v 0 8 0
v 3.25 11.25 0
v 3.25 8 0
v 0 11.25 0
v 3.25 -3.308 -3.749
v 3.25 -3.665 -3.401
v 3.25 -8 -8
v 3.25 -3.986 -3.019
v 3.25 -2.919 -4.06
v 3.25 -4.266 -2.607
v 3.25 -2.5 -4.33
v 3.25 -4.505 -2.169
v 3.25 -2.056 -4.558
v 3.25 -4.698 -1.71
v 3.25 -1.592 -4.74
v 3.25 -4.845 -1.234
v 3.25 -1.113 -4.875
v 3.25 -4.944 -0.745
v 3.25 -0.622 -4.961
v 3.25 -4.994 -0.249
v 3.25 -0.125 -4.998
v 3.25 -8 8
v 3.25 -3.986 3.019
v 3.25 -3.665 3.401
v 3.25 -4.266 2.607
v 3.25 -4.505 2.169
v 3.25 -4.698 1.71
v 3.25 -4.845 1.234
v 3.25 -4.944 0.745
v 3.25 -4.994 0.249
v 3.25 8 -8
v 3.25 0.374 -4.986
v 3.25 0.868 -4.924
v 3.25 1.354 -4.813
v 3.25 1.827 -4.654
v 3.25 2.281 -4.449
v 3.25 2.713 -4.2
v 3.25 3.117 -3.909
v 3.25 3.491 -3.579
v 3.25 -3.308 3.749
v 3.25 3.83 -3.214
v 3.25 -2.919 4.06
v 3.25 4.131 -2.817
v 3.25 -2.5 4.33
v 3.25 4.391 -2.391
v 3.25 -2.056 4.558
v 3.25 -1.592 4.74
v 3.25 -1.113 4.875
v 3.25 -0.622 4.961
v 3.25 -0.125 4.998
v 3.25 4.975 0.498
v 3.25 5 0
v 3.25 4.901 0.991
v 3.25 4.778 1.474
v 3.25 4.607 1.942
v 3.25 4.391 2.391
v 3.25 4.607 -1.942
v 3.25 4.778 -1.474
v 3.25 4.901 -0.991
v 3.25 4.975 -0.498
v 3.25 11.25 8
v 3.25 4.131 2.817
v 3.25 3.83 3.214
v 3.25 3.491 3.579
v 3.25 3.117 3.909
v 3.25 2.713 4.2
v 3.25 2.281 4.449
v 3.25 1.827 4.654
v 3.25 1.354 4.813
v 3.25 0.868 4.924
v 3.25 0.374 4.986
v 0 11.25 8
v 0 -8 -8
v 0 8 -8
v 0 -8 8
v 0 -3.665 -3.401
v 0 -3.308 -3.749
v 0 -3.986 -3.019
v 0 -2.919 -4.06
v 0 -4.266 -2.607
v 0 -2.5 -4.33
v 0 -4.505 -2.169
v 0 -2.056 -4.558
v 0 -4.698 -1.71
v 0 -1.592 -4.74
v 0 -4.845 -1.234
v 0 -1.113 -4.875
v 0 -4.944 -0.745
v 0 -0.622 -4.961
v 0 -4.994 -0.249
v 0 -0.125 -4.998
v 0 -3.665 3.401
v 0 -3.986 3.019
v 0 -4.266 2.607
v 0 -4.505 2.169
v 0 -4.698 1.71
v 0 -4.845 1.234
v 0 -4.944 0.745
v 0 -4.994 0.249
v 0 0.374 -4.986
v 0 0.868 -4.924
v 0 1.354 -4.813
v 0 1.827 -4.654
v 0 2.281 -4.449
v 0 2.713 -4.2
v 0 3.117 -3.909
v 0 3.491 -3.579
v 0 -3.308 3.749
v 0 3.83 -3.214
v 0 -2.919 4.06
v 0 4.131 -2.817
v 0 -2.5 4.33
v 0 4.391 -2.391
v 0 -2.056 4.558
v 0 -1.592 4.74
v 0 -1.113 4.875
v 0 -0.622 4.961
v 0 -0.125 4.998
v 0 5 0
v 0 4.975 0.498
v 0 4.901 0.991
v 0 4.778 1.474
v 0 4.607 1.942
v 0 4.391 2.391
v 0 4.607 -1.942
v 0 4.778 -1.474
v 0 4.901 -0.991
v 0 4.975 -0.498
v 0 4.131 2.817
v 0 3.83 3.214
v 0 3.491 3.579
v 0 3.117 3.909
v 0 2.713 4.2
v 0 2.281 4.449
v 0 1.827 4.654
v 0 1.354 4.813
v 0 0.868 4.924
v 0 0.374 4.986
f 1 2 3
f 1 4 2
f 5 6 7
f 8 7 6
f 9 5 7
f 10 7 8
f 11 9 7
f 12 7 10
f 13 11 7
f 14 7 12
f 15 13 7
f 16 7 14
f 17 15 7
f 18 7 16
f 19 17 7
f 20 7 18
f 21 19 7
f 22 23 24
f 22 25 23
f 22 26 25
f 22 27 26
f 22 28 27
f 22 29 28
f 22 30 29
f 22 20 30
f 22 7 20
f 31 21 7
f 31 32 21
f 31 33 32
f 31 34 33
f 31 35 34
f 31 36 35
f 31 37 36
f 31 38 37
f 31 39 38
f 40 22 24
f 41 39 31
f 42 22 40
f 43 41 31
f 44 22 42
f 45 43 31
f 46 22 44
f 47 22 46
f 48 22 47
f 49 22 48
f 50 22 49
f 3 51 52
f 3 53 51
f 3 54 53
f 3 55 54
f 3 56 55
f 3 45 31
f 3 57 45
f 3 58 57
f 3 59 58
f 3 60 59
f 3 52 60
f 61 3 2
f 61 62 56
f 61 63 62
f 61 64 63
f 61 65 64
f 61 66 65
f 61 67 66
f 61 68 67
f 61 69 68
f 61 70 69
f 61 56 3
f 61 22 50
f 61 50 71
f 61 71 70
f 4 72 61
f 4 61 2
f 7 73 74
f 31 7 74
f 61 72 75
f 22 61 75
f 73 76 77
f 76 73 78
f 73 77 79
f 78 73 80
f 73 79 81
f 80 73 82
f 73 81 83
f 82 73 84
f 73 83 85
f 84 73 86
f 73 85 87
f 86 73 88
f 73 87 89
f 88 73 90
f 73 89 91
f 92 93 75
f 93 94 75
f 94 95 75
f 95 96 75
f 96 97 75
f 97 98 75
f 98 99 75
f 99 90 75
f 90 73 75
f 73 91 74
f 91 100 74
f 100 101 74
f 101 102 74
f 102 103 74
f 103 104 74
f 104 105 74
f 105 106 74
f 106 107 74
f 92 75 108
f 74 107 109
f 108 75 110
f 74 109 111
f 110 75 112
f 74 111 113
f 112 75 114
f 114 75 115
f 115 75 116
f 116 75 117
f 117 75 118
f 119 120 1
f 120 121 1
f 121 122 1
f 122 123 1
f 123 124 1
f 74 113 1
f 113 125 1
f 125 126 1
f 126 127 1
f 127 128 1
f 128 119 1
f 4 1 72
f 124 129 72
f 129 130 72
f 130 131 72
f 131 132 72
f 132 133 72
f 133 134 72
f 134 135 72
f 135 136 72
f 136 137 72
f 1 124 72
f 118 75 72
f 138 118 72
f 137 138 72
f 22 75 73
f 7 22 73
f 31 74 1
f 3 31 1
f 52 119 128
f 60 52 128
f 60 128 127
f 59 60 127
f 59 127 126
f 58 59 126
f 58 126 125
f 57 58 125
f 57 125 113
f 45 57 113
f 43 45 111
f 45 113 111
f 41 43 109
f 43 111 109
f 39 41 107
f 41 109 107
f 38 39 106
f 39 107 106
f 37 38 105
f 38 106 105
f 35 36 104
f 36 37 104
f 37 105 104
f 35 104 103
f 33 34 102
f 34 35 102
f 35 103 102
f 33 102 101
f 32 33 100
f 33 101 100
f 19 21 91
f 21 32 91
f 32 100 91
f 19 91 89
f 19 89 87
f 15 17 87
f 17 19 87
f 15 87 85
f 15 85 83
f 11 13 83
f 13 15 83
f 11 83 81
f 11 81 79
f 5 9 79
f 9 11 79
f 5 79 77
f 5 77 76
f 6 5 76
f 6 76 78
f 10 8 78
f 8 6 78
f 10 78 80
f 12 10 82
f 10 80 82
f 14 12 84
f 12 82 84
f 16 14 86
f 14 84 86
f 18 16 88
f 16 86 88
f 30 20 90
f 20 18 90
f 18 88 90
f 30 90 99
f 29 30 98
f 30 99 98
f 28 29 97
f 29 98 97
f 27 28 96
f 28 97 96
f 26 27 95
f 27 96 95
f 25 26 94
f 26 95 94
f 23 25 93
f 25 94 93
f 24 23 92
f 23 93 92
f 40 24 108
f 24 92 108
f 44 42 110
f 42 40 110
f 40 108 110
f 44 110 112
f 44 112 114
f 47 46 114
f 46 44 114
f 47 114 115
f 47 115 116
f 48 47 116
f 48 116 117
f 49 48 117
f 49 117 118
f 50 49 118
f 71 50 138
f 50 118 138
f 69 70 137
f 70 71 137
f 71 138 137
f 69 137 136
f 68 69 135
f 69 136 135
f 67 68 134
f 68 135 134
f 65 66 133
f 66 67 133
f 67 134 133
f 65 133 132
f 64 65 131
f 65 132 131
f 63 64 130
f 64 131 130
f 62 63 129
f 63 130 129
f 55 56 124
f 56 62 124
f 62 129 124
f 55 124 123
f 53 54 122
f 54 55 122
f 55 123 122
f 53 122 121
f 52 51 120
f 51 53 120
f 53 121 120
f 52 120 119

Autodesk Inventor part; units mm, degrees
ref_plane "YZ Plane" through (0, 0, 0) normal (1, 0, 0) x (0, 1, 0)
ref_plane "XZ Plane" through (0, 0, 0) normal (0, 1, 0) x (-1, 0, 0)
ref_plane "XY Plane" through (0, 0, 0) normal (0, 0, 1) x (1, 0, 0)
sketch "Sketch1" plane through (0, 0, 0) normal (1, 0, 0) x (0, 1, 0)
  line L0 (-92.7646, -8.503) -> (-89.7646, -8.503)
  line L1 (-89.7646, -8.503) -> (-89.7646, -11.753)
  line L2 (-89.7646, -11.753) -> (-92.7646, -11.753)
  line L3 (-92.7646, -11.753) -> (-92.7646, -8.503)
  line L4 (-92.7646, -21.6527) -> (-89.7646, -21.6527)
  line L5 (-89.7646, -21.6527) -> (-89.7646, -21.7527)
  line L6 (-89.7646, -21.7527) -> (-92.7646, -21.7527)
  line L7 (-92.7646, -21.7527) -> (-92.7646, -21.6527)
  circle A0 centre (0, 0) radius 5
  line L8 (-8, -8) -> (8, -8)
  line L9 (8, -8) -> (8, 8)
  line L10 (8, 8) -> (-8, 8)
  line L11 (-8, 8) -> (-8, -8)
  line L12 (-8, 0) -> (8, 0) construction
  line L13 (0, 8) -> (0, -8) construction
  line L14 (8, 8) -> (11.25, 8)
  line L15 (11.25, 8) -> (11.25, 0)
  line L16 (11.25, 0) -> (8, 0)
  line L17 (8, 0) -> (8, 8)
  dimension "d0" = 3
  dimension "mat" = 3.25
  dimension "d2" = 3
  dimension "kerf" = 0.1
  dimension "d22" = 10
  dimension "d23" = 16
  dimension "d24" = 16
  dimension "d25" = 3.25
  dimension "d26" = 8
extrude "Extrusion3" add sketch "Sketch1" along normal blind 3.25 contours L11 L10 L9 L8 | L9 L14 L15 L16
equation "\"d25\" = mat"
equation "\"d27\" = mat"
properties part number "body-side2"
